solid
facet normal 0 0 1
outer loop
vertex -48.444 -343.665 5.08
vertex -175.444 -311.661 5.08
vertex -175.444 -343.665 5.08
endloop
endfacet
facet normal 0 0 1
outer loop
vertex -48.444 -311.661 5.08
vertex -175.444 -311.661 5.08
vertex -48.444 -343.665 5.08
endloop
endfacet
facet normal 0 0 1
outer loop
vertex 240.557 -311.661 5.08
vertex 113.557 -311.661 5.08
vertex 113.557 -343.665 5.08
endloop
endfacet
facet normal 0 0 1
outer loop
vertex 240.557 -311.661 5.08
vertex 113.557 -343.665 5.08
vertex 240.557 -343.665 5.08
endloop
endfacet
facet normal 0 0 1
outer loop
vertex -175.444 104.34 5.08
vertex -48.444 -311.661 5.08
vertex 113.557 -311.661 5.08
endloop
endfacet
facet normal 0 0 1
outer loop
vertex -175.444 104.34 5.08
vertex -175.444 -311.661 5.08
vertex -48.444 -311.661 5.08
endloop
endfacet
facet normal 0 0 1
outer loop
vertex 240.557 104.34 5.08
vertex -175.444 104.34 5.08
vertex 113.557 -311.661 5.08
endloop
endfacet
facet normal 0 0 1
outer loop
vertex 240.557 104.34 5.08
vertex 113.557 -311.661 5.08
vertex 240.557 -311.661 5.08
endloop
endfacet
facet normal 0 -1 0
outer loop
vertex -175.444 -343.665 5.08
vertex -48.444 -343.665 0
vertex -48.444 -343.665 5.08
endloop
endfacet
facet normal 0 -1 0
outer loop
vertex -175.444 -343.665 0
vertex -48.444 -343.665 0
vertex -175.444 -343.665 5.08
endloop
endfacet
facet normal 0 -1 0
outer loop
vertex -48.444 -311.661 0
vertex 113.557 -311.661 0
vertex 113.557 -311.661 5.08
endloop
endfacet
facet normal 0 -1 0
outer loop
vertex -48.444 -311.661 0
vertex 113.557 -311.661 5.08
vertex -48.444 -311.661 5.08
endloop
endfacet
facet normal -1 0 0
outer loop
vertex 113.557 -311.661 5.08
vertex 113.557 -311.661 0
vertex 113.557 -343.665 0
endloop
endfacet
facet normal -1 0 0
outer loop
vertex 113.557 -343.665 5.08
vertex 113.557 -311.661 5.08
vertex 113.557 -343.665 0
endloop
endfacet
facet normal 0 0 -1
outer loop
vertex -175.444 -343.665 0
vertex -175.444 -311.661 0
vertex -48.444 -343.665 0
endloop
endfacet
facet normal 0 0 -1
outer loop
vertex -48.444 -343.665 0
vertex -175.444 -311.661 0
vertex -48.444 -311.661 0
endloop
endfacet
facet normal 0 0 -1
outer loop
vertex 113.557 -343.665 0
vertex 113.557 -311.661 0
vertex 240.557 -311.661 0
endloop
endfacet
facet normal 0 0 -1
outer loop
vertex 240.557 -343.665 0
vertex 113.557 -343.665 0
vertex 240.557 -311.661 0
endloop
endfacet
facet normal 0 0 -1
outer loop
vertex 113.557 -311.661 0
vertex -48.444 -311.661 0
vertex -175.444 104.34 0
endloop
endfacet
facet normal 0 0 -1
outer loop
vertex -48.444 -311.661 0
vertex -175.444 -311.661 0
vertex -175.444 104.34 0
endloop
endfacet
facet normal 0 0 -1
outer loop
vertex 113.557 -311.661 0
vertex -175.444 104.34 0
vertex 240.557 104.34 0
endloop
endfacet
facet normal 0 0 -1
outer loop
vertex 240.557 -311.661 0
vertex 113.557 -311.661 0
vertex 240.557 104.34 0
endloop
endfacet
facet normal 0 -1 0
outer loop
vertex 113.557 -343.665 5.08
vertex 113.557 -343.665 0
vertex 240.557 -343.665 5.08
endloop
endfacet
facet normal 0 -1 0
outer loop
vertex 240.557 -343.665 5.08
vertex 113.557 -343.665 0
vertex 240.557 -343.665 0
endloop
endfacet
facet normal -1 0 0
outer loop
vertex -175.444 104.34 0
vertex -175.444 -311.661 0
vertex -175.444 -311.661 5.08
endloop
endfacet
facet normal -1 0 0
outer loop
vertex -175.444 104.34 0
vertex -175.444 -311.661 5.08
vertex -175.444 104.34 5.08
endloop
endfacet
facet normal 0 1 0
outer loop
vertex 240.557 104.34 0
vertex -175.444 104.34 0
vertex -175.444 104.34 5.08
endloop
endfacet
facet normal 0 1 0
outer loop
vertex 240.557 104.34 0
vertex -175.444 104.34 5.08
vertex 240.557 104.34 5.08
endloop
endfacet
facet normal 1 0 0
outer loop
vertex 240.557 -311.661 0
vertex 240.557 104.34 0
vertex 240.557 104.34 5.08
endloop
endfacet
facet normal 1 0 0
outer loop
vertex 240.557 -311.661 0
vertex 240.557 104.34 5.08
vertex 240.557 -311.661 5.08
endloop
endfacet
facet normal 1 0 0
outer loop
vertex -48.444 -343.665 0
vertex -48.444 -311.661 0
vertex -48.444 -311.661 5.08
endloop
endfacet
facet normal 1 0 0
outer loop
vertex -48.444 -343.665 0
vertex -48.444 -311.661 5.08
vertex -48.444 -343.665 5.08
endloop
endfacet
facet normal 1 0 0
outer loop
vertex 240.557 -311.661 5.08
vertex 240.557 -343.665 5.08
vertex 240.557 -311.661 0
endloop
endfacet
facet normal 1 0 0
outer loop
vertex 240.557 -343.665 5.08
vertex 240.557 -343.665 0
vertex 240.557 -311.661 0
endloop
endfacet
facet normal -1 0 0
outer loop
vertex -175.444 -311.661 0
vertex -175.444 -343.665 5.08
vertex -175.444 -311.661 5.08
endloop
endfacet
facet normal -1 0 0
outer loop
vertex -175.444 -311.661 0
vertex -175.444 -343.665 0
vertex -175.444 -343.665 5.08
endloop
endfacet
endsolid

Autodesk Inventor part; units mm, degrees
ref_plane "YZ Plane" through (0, 0, 0) normal (1, 0, 0) x (0, 1, 0)
ref_plane "XZ Plane" through (0, 0, 0) normal (0, 1, 0) x (-1, 0, 0)
ref_plane "XY Plane" through (0, 0, 0) normal (0, 0, 1) x (1, 0, 0)
sketch "Sketch1" plane through (0, 0, 0) normal (0, 0, 1) x (1, 0, 0)
  line L0 (-175.444, 104.3404) -> (240.5572, 104.3404)
  line L1 (240.5572, 104.3404) -> (240.5572, -311.6608)
  line L2 (113.5572, -311.6608) -> (-48.444, -311.6608)
  line L3 (-175.444, -311.6608) -> (-175.444, 104.3404)
  line L4 (-48.444, -311.6608) -> (-48.444, -343.6648)
  line L5 (-48.444, -343.6648) -> (-175.444, -343.6648)
  line L6 (-175.444, -343.6648) -> (-175.444, -311.6608)
  line L7 (113.5572, -311.6608) -> (113.5572, -343.6648)
  line L8 (113.5572, -343.6648) -> (240.5572, -343.6648)
  line L9 (240.5572, -343.6648) -> (240.5572, -311.6608)
  point P0 (0, 0)
  dimension "d0" = 416.0012
  dimension "d1" = 416.0012
  dimension "d2" = 127
  dimension "d3" = 127
  dimension "d4" = 162.0012
  dimension "d5" = 32.004
extrude "Extrusion1" add sketch "Sketch1" along normal blind 5.08
properties part number "plate"
